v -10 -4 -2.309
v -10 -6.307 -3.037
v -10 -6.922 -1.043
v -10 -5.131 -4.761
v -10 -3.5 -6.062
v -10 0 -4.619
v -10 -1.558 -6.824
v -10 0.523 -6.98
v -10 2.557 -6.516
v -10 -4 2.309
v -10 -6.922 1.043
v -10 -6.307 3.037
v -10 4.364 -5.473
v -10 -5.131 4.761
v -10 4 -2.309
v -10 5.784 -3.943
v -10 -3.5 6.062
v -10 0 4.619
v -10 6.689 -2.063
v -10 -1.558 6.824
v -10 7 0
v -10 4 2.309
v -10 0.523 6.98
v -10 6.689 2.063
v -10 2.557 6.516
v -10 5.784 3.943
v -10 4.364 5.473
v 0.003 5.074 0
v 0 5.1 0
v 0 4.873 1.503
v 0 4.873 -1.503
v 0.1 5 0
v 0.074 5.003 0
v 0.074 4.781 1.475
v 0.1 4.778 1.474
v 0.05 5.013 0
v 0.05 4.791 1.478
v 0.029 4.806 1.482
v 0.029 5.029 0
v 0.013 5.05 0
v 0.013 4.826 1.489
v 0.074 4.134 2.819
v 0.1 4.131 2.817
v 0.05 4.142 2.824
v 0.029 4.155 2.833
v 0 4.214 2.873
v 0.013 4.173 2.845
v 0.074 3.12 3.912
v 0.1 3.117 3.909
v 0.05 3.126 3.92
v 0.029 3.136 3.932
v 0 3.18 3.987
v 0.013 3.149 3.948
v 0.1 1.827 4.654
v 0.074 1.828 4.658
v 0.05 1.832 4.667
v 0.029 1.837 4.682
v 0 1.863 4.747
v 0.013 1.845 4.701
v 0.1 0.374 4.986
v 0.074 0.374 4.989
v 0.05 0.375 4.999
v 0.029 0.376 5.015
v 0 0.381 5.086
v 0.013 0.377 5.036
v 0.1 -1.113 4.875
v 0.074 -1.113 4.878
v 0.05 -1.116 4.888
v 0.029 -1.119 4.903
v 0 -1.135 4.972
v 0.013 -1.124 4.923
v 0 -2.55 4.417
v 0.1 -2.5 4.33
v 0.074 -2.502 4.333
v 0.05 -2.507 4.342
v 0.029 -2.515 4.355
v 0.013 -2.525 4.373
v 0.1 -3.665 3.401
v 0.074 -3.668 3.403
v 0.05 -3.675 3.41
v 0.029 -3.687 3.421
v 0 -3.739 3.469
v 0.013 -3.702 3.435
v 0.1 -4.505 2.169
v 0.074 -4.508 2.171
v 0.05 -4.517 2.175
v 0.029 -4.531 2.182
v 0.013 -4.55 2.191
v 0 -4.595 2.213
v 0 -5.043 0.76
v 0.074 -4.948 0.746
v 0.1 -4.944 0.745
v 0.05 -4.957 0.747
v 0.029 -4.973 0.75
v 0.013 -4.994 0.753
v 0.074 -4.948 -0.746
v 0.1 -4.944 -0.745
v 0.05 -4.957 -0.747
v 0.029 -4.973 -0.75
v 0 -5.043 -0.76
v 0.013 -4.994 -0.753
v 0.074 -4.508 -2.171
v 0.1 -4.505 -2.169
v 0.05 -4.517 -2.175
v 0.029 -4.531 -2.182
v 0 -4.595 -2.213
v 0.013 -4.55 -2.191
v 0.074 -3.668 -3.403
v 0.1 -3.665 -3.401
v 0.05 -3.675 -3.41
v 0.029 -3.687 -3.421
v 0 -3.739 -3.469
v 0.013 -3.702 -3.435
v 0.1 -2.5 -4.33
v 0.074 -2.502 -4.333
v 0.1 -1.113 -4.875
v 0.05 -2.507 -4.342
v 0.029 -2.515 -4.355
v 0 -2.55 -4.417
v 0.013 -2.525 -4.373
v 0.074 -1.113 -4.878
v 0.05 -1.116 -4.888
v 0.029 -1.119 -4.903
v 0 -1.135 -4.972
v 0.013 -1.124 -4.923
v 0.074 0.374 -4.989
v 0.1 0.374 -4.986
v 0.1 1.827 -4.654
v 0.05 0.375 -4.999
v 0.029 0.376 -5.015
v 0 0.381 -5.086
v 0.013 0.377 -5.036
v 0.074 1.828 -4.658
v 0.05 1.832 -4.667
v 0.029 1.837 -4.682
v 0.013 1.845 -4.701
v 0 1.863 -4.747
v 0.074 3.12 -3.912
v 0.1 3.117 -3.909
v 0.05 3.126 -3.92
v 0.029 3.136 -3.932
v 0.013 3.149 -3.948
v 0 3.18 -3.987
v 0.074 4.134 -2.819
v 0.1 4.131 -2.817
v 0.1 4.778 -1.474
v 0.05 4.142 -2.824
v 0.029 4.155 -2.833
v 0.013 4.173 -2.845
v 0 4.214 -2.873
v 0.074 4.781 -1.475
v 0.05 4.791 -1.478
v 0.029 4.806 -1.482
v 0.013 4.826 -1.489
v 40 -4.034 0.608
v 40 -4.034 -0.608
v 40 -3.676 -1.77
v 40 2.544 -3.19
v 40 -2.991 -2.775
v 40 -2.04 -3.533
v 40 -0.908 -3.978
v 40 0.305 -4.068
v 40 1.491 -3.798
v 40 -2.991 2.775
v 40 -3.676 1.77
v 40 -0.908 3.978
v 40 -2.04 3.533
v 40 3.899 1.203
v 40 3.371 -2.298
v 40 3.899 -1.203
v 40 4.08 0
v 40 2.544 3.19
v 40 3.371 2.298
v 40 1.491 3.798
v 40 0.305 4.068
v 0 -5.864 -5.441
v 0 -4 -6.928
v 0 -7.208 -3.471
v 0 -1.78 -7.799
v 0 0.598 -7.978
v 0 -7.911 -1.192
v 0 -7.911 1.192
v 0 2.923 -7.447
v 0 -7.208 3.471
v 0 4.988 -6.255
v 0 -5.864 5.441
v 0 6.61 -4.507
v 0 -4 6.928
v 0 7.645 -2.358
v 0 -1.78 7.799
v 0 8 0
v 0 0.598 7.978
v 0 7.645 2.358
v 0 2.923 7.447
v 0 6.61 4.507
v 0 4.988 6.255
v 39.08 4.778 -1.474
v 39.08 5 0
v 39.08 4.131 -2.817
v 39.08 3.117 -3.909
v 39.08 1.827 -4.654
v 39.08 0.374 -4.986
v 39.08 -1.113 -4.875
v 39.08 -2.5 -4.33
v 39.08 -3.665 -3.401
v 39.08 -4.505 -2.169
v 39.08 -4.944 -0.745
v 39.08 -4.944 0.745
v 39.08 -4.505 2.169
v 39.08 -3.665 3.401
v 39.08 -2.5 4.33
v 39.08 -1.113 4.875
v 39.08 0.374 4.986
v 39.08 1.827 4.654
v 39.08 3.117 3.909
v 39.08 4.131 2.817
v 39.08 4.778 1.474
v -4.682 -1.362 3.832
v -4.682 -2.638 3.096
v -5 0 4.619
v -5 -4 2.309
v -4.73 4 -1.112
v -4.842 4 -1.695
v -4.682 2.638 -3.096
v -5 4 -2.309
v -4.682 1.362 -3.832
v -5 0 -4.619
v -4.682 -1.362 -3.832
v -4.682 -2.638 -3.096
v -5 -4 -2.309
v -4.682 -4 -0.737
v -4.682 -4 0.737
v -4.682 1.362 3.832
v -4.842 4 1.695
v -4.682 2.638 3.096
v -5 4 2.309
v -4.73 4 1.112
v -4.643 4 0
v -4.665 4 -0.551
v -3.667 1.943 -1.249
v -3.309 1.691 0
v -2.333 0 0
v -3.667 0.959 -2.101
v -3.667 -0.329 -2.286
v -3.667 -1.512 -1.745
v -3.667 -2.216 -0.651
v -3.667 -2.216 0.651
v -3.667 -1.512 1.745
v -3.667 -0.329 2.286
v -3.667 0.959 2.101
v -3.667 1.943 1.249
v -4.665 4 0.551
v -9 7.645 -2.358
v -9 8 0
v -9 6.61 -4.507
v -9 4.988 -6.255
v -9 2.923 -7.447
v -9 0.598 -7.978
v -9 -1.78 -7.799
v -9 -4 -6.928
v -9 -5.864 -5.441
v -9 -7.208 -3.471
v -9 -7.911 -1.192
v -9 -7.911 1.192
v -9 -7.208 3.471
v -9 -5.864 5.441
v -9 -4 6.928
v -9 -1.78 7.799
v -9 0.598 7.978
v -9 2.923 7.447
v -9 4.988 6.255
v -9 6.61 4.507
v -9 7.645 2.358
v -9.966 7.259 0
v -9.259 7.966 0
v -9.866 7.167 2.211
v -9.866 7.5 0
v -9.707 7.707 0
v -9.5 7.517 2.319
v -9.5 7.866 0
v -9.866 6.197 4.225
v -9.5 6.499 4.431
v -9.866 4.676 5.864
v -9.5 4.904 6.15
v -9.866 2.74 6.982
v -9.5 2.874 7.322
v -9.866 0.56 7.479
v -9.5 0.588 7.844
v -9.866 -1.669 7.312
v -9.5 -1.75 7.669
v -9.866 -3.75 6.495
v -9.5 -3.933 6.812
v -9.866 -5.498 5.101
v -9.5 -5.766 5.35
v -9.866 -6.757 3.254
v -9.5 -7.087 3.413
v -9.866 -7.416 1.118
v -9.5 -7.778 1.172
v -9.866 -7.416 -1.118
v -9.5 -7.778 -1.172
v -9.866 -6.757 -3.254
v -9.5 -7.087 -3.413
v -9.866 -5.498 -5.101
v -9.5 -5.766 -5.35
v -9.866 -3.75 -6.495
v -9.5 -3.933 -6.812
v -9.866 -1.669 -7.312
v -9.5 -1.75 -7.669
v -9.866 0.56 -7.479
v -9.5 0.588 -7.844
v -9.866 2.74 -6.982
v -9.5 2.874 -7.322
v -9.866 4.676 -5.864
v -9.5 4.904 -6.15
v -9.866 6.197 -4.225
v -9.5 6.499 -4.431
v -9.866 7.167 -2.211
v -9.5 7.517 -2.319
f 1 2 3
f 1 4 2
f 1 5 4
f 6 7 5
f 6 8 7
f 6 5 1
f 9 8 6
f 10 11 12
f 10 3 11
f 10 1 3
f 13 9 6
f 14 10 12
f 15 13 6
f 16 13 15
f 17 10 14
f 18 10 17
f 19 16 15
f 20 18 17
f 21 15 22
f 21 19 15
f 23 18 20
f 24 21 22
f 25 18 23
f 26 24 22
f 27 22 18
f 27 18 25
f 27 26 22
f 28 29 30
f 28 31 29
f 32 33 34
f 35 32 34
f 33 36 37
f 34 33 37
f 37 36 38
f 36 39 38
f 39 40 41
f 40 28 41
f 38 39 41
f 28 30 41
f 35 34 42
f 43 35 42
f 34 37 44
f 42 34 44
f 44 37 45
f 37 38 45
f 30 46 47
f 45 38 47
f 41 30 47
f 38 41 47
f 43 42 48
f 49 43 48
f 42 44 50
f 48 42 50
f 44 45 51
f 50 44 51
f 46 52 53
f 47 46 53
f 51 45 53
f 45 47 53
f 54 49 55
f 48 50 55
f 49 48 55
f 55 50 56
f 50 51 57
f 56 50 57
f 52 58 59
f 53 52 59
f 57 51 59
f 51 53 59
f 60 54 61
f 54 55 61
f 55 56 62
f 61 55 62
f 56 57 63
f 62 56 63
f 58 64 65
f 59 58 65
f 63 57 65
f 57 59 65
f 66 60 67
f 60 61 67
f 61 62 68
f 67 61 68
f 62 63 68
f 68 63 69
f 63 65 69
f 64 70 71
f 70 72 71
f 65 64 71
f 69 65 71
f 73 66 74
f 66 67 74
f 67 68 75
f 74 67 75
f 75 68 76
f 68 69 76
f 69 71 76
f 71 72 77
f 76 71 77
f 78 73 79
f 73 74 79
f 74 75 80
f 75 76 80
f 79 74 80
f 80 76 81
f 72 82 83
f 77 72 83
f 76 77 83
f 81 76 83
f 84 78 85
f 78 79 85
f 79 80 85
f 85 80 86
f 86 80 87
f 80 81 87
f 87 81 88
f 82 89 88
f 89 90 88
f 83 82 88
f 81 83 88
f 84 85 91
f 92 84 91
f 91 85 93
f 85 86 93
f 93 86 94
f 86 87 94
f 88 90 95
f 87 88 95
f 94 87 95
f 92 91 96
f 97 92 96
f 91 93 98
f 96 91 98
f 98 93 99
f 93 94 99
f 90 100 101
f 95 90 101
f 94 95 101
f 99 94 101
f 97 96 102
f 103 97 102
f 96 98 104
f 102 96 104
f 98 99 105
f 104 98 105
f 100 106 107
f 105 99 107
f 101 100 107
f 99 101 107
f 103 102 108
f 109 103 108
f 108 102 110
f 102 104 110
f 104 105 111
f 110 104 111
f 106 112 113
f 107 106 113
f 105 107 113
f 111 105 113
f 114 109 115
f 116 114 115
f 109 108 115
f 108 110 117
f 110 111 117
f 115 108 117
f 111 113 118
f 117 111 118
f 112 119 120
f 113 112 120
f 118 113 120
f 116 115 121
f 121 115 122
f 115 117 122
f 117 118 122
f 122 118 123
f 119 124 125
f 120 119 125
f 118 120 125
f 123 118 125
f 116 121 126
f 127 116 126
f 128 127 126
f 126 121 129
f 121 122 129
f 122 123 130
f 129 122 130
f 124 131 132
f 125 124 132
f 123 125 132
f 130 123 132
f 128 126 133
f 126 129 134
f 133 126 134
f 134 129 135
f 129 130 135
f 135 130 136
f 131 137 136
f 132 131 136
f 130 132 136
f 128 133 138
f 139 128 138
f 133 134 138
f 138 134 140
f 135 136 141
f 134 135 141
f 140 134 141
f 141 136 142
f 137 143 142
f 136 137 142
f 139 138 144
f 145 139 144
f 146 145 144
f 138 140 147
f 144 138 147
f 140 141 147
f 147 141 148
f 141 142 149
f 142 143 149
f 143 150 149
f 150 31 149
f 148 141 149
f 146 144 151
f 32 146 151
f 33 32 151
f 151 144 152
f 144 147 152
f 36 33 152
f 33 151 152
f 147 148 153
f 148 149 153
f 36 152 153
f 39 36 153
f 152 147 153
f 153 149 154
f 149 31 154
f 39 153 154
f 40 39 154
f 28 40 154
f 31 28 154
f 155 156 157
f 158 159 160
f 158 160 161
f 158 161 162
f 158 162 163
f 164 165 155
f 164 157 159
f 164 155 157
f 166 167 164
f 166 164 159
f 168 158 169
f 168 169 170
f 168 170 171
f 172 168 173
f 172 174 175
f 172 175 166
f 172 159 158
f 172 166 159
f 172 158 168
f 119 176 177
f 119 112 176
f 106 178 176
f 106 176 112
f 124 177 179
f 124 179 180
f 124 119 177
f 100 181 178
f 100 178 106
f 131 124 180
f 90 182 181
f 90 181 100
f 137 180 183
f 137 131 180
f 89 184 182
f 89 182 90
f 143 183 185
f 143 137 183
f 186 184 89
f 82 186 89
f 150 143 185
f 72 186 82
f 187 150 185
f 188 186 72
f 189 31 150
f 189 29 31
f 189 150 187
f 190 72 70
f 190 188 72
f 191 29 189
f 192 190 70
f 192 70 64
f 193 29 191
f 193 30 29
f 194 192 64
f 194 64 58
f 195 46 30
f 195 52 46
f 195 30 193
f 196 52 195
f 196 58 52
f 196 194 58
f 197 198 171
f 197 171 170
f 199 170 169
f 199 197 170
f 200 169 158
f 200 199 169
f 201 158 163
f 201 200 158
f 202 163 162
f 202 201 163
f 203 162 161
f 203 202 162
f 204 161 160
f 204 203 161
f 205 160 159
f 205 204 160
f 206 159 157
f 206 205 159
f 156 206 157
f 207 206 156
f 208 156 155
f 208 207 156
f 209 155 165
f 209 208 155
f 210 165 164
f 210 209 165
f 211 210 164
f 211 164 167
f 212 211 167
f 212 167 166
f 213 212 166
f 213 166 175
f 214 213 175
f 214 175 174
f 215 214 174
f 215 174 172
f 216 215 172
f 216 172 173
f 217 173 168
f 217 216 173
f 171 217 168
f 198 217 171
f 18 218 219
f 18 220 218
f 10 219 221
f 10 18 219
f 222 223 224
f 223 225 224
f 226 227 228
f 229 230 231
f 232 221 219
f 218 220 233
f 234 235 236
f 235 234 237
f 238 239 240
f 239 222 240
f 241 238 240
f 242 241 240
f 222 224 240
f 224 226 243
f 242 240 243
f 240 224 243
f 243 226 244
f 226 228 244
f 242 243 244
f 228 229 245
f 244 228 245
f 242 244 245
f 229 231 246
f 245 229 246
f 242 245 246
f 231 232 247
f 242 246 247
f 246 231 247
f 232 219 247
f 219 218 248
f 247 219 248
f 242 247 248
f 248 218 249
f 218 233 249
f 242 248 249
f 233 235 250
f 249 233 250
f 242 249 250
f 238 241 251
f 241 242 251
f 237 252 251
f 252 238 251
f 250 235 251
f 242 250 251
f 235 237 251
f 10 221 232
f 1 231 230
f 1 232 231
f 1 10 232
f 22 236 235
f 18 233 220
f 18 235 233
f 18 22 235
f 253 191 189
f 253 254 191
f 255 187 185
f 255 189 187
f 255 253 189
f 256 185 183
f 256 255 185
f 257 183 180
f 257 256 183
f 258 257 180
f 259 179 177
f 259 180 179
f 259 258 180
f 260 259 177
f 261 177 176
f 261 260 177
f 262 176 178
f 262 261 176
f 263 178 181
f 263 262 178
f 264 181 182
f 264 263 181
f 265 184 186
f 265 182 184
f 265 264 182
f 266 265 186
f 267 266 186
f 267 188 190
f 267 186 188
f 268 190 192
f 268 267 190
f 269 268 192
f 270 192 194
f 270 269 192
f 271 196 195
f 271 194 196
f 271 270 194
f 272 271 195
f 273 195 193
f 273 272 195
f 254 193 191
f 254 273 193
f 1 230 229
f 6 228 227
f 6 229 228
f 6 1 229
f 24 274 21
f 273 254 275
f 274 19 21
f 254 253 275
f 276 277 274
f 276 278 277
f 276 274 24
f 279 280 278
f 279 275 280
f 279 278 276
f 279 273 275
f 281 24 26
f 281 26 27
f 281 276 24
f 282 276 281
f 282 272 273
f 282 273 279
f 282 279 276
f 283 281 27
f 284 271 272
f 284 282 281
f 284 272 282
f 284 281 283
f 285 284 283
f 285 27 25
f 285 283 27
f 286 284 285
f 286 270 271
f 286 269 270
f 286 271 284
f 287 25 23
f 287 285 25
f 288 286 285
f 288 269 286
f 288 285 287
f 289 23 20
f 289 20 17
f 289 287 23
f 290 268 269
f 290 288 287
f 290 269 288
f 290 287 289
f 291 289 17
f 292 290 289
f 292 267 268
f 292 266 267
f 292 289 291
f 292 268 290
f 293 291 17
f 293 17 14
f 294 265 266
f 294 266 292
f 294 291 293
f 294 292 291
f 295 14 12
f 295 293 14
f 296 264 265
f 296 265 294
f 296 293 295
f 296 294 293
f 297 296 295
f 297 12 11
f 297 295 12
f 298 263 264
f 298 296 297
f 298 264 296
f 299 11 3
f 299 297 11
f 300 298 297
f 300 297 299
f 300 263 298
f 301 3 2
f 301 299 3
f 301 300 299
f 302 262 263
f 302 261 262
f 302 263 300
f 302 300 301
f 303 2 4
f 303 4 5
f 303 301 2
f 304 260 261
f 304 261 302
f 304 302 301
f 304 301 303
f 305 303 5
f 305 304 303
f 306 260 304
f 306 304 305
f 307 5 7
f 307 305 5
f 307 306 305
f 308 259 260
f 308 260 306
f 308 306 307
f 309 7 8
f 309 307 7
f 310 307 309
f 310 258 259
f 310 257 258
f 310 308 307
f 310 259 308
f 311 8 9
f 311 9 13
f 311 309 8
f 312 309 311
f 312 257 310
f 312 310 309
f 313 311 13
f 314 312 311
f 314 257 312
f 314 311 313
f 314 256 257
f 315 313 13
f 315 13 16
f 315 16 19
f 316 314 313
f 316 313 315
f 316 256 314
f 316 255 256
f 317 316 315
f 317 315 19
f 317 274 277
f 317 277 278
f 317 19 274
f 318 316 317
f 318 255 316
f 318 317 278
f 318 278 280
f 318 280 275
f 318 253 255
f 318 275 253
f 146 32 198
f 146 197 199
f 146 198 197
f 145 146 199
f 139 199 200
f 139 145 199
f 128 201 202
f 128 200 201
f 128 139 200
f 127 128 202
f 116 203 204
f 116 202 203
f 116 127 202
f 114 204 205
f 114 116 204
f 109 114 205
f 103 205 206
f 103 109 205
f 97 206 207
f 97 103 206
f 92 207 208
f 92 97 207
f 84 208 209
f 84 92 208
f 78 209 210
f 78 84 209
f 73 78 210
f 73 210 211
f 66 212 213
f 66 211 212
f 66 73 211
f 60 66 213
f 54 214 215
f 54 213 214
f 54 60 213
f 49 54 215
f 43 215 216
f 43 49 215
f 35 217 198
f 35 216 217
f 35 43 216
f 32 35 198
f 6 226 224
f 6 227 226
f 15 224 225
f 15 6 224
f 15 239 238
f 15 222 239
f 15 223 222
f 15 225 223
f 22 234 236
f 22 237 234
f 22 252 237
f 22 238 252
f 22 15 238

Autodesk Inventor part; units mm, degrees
ref_plane "YZ Plane" through (0, 0, 0) normal (1, 0, 0) x (0, 1, 0)
ref_plane "XZ Plane" through (0, 0, 0) normal (0, 1, 0) x (-1, 0, 0)
sketch "Rascunho1" plane through (0, 0, 0) normal (0, 0, 1) x (1, 0, 0)
  line L0 (-2.3333, 0) -> (40, 0)
  line L1 (40, 0) -> (40, 5)
  line L2 (40, 5) -> (3.75, 5)
  line L3 (3.75, 5) -> (2.8297, 5)
  line L4 (2.8297, 5) -> (0, 5)
  line L5 (0, 5) -> (0, 8)
  line L6 (0, 8) -> (-10, 8)
  line L7 (-10, 8) -> (-10, 4.6188)
  line L8 (-10, 4.6188) -> (-5, 4.6188)
  line L9 (-5, 4.6188) -> (-2.3333, 0)
  line L10 (-20, 0) -> (50, 0) projected
  line L11 (0, -1.6) -> (0, 9.6) projected
  line L12 (3.75, 5) -> (0, 5) construction
  dimension "d1" = 36.25
  dimension "d2" = 0.9203
  dimension "d3" = 10
  dimension "d4" = 5
  dimension "d5" = 60
  dimension "d6" = 10
  dimension "d7" = 10
  dimension "d8" = 9.2376
  dimension "d9" = 16
  dimension "d26" = 40
revolve "Corpo" add sketch "Rascunho1" angle 360 about axis through (-2.3333, 0, 0) along (1, 0, 0)
sketch "Rascunho2" plane through (-10, 0, 0) normal (-1, 0, 0) x (0, 0, 1)
  circle A0 centre (0, 0) radius 4.6188 projected
  line L0 (0, -11.2) -> (0, 11.2) projected
  line L1 (-11.2, 0) -> (11.2, 0) projected
  line L2 (4.6188, 0) -> (2.3094, -4)
  line L3 (2.3094, -4) -> (-2.3094, -4)
  line L4 (-2.3094, -4) -> (-4.6188, 0)
  line L5 (-4.6188, 0) -> (-2.3094, 4)
  line L6 (-2.3094, 4) -> (2.3094, 4)
  line L7 (2.3094, 4) -> (4.6188, 0)
extrude "Fenda" add sketch "Rascunho2" against normal up to next contours L7 A0 | A0 L2 | L6 L0 A0 | A0 L0 L3 | L0 L6 A0 | A0 L3 L0 | L4 A0 | A0 L5
fillet "Raio de arredondamento1" radius 1 1 edges at (-10, -8, 0)
thread "Rosca" size "M10x1.5" class "6g" standard "ISO Metric profile" length 36.25
chamfer "Chanfrar1" distance 0.9202 distance2 0.9202 1 edges at (40, -5, 0) measured on face at (40, -1.105, 0.7295)
ref_plane "Work Plane1" through (29, 0, 0) normal (0, -1, 0) x (1, 0, 0)
fillet "Fillet2" radius 0.1 1 edges at (0, -5, 0)
equation "\"d1\" = GEL"
equation "\"d3\" = KOH"
equation "\"d4\" = INTI"
equation "\"d6\" = GD"
equation "\"d7\" = BDM"
equation "\"d8\" = 1.1547 * SW"
equation "\"d9\" = KOD"
equation "\"d26\" = NLG"
equation "\"d17\" = RR"
equation "\"d13\" = GEL"
equation "\"d15\" = -0.5 * SPD + 0.5 * GD"
equation "\"d16\" = GUL"
equation "\"d30\" = R"
equation "\"GD\" = NND"
equation "\"NLG\" = 40"
equation "\"GEL\" = 36.25"
equation "\"KOD\" = 16"
equation "\"KOH\" = 10"
equation "\"INTI\" = 5"
equation "\"GAL\" = 0.61345 * PTC"
equation "\"GUL\" = 0.61345 * PTC"
equation "\"BDM\" = NND"
equation "\"SW\" = 8"
equation "\"RR\" = 0.1 * KOH"
equation "\"SPD\" = NND - 1.2269 * PTC"
equation "\"R\" = 0.1"
equation "\"TOA\" = 30deg"
equation "\"GD1\" = THREADDIA - 1.2269 * PTC"
equation "\"FAWI\" = 45deg"
equation "\"ANG\" = 120deg"
equation "\"PTC\" = 1.5"
equation "\"E0\" = 1.155 * SW"
equation "\"NND\" = 10"
equation "\"THREADDIA\" = 10"
properties part number "DIN 912 - M10 x 40 (c)" material "Aço Inox AISI 304"
